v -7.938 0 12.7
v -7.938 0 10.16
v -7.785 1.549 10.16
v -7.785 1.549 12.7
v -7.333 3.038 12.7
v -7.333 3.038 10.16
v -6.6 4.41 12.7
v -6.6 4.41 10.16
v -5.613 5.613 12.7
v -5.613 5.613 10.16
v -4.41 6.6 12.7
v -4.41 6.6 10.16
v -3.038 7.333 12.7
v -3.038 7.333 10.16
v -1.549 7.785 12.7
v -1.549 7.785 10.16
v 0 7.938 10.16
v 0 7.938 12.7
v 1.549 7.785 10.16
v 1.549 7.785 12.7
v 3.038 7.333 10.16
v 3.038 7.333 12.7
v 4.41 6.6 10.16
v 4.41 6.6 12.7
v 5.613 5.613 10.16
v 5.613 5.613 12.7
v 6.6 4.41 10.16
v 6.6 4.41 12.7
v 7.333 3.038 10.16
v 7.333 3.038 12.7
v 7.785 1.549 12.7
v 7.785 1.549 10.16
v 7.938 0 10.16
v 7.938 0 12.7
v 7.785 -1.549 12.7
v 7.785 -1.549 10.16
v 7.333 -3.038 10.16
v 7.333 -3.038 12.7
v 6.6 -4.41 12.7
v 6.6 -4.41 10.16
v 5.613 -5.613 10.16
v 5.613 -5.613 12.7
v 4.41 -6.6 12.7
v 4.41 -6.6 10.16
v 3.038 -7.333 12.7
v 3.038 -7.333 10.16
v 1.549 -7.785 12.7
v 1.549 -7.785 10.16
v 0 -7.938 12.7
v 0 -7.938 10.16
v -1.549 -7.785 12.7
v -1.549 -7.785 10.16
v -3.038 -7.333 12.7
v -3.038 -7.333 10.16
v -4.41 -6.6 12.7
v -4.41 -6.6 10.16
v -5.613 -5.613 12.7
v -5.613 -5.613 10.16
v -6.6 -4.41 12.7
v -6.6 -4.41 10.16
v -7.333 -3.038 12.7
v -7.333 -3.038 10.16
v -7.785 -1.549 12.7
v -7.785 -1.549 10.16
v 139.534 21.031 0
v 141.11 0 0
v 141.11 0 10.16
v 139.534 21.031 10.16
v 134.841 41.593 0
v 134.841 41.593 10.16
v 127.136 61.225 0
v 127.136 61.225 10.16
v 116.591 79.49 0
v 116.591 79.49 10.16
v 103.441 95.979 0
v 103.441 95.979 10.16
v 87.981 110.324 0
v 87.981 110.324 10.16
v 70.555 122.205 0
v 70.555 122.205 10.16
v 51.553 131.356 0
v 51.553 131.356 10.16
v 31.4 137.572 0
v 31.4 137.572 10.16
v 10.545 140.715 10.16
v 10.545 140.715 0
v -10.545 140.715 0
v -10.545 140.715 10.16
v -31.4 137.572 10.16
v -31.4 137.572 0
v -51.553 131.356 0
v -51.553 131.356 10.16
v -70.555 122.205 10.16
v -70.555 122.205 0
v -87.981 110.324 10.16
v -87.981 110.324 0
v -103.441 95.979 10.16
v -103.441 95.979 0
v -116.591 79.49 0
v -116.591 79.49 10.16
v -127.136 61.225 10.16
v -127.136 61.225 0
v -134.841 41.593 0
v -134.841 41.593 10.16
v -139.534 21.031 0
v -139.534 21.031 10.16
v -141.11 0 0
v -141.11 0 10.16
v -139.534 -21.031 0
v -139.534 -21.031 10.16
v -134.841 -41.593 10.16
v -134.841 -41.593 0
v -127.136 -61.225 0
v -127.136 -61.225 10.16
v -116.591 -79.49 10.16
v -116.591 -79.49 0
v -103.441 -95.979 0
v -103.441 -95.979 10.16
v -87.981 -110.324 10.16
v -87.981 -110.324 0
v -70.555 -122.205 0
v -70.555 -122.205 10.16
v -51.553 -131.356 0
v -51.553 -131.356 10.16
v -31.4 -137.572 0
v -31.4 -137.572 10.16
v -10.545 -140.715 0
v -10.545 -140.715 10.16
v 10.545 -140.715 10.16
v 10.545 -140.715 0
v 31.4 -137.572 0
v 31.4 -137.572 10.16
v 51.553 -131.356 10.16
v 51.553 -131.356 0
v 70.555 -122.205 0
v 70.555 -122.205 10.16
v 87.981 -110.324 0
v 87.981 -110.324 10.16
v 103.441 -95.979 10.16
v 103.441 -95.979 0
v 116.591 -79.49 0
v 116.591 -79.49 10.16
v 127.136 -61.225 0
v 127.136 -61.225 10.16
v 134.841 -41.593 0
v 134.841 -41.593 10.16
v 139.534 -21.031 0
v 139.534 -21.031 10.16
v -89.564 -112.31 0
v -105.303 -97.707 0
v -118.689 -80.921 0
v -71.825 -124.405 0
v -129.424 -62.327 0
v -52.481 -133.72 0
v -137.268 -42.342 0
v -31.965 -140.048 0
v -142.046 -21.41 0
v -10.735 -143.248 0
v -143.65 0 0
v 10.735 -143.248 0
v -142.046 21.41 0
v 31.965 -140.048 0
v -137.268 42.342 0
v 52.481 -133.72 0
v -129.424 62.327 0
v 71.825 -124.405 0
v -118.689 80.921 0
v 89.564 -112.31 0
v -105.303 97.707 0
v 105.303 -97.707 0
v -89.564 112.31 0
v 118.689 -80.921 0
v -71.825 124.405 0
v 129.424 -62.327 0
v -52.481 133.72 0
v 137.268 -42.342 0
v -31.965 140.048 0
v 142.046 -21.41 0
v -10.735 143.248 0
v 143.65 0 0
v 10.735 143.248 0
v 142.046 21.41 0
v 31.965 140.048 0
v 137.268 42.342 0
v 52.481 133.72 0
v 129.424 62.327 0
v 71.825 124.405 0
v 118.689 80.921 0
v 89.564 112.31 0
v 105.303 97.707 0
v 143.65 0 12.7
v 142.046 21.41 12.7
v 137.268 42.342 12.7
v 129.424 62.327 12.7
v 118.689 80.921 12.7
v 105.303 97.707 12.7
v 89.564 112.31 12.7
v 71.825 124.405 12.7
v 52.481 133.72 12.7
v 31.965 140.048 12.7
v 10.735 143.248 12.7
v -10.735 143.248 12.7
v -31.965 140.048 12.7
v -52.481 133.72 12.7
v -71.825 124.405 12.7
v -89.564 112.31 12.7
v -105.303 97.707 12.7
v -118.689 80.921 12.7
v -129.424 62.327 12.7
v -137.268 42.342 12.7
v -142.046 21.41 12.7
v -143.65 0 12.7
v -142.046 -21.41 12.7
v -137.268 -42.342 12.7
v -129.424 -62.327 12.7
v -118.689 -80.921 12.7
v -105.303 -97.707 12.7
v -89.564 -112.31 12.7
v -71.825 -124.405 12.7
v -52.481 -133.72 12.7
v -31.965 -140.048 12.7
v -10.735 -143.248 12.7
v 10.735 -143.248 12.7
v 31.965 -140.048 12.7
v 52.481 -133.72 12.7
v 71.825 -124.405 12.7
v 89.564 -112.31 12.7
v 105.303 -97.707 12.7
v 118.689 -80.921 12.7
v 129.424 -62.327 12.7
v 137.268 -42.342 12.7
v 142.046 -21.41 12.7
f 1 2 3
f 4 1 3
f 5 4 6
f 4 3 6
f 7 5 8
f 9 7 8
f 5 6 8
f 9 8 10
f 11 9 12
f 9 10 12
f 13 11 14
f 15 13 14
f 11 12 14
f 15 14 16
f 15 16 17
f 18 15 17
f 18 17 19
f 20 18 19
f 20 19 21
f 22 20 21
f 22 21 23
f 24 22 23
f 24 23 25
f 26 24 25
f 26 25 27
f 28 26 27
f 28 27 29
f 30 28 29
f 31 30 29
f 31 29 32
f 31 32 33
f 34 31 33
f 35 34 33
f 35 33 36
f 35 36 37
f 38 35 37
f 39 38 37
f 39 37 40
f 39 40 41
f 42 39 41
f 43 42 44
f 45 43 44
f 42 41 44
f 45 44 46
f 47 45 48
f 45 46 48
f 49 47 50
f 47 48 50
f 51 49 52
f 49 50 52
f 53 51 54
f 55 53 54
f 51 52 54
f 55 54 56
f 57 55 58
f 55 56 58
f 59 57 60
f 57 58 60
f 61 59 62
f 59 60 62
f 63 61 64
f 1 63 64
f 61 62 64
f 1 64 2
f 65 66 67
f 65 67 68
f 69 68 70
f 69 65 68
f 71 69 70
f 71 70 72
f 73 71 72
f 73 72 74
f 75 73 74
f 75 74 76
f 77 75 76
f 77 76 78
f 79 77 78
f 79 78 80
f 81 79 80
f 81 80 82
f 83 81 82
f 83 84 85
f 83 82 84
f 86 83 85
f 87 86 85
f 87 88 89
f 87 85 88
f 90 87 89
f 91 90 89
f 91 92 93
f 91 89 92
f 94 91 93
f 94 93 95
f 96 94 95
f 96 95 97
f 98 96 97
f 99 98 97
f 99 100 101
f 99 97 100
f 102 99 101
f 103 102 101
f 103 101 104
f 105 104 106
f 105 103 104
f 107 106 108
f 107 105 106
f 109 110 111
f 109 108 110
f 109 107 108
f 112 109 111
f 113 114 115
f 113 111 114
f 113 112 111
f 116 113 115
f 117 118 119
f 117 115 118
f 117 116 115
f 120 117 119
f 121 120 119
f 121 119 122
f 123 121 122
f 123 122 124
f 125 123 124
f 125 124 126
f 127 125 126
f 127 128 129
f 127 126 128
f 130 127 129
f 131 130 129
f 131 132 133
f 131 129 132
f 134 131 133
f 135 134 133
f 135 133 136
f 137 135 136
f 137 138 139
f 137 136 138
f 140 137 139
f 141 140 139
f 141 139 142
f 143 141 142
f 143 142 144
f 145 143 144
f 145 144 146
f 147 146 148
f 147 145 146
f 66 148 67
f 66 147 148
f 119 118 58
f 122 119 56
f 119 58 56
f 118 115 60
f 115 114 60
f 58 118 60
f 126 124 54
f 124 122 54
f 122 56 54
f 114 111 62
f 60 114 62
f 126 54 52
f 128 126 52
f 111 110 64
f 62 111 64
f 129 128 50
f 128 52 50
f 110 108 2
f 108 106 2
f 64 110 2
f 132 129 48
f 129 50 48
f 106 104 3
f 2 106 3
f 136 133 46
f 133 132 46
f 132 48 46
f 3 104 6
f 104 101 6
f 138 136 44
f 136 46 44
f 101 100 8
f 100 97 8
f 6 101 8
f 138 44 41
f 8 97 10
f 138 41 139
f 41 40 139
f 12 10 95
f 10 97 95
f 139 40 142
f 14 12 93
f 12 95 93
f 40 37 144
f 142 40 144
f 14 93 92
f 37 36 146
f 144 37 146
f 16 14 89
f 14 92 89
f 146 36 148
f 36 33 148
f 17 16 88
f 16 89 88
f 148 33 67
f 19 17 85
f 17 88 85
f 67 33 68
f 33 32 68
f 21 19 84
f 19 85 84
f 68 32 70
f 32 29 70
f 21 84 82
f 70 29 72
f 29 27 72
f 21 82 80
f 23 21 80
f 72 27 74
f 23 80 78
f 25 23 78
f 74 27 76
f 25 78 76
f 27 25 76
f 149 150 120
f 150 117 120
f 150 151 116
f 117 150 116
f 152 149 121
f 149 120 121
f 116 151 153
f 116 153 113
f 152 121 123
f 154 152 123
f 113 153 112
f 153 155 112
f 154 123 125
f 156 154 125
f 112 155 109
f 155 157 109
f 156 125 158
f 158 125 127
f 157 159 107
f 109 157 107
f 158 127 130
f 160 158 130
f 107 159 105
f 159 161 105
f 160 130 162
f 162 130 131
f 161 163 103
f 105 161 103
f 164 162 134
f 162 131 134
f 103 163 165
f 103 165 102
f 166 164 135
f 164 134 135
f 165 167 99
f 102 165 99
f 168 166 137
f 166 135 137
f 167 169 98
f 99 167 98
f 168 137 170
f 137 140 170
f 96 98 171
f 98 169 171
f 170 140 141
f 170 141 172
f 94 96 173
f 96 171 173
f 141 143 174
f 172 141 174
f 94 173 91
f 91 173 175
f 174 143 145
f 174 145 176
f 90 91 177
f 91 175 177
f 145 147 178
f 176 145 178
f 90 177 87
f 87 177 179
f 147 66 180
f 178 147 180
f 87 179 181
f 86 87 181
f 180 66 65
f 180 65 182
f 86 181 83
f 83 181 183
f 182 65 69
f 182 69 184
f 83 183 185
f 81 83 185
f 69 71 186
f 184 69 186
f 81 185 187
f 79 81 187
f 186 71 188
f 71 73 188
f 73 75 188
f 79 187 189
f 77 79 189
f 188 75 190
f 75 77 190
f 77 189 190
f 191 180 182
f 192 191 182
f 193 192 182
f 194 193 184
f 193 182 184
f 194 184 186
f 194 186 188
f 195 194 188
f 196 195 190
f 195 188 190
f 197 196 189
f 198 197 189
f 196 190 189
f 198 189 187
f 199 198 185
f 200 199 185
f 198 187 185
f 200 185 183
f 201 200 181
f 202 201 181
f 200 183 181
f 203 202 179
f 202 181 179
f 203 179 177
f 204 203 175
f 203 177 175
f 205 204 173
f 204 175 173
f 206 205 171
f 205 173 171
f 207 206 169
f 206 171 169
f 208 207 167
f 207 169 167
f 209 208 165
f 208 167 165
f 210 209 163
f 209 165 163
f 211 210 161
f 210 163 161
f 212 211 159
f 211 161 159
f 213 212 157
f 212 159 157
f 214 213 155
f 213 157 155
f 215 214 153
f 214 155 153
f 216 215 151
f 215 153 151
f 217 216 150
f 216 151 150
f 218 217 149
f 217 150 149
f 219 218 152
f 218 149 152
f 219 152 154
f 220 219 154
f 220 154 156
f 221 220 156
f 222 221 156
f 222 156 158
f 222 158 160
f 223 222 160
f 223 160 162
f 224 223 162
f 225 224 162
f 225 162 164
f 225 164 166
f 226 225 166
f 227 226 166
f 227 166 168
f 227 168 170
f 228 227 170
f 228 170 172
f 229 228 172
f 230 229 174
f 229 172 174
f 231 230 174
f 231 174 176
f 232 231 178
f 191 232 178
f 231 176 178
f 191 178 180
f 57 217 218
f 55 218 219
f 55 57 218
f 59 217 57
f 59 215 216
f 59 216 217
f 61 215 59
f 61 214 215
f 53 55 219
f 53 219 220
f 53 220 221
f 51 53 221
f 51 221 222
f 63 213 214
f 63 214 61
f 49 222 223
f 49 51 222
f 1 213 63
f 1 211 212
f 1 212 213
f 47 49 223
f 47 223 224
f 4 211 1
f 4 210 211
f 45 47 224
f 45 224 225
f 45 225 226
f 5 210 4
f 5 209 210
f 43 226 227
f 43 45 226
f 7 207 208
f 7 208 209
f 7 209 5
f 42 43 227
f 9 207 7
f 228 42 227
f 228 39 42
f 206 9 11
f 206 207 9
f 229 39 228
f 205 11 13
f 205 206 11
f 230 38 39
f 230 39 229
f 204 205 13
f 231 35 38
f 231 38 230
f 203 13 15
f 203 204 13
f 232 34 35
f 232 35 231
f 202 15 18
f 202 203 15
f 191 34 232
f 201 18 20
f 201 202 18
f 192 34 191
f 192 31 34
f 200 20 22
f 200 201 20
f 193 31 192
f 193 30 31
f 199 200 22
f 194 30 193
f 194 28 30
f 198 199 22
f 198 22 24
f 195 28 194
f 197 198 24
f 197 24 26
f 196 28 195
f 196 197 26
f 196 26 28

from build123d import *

# Parameters (mm, degrees)
F0_R     = 143.65
F1_DEPTH = 12.7
F2_T     = -2.54
F4_D     = 15.875


with BuildPart() as f1:
    # F0 (on Top) → F1 (new body)
    with BuildSketch(Plane.XY):
        Circle(F0_R)
    extrude(amount=F1_DEPTH)

    # F2
    f2_openings = [f1.faces().sort_by_distance(p)[0] for p in [
        (0, 0, 0),
    ]]
    offset(amount=F2_T, openings=f2_openings)

    # F4 (through all)
    with Locations(Plane.XY.offset(12.7)):
        with Locations((0, 0)):
            Hole(F4_D / 2)


solid = f1.part
